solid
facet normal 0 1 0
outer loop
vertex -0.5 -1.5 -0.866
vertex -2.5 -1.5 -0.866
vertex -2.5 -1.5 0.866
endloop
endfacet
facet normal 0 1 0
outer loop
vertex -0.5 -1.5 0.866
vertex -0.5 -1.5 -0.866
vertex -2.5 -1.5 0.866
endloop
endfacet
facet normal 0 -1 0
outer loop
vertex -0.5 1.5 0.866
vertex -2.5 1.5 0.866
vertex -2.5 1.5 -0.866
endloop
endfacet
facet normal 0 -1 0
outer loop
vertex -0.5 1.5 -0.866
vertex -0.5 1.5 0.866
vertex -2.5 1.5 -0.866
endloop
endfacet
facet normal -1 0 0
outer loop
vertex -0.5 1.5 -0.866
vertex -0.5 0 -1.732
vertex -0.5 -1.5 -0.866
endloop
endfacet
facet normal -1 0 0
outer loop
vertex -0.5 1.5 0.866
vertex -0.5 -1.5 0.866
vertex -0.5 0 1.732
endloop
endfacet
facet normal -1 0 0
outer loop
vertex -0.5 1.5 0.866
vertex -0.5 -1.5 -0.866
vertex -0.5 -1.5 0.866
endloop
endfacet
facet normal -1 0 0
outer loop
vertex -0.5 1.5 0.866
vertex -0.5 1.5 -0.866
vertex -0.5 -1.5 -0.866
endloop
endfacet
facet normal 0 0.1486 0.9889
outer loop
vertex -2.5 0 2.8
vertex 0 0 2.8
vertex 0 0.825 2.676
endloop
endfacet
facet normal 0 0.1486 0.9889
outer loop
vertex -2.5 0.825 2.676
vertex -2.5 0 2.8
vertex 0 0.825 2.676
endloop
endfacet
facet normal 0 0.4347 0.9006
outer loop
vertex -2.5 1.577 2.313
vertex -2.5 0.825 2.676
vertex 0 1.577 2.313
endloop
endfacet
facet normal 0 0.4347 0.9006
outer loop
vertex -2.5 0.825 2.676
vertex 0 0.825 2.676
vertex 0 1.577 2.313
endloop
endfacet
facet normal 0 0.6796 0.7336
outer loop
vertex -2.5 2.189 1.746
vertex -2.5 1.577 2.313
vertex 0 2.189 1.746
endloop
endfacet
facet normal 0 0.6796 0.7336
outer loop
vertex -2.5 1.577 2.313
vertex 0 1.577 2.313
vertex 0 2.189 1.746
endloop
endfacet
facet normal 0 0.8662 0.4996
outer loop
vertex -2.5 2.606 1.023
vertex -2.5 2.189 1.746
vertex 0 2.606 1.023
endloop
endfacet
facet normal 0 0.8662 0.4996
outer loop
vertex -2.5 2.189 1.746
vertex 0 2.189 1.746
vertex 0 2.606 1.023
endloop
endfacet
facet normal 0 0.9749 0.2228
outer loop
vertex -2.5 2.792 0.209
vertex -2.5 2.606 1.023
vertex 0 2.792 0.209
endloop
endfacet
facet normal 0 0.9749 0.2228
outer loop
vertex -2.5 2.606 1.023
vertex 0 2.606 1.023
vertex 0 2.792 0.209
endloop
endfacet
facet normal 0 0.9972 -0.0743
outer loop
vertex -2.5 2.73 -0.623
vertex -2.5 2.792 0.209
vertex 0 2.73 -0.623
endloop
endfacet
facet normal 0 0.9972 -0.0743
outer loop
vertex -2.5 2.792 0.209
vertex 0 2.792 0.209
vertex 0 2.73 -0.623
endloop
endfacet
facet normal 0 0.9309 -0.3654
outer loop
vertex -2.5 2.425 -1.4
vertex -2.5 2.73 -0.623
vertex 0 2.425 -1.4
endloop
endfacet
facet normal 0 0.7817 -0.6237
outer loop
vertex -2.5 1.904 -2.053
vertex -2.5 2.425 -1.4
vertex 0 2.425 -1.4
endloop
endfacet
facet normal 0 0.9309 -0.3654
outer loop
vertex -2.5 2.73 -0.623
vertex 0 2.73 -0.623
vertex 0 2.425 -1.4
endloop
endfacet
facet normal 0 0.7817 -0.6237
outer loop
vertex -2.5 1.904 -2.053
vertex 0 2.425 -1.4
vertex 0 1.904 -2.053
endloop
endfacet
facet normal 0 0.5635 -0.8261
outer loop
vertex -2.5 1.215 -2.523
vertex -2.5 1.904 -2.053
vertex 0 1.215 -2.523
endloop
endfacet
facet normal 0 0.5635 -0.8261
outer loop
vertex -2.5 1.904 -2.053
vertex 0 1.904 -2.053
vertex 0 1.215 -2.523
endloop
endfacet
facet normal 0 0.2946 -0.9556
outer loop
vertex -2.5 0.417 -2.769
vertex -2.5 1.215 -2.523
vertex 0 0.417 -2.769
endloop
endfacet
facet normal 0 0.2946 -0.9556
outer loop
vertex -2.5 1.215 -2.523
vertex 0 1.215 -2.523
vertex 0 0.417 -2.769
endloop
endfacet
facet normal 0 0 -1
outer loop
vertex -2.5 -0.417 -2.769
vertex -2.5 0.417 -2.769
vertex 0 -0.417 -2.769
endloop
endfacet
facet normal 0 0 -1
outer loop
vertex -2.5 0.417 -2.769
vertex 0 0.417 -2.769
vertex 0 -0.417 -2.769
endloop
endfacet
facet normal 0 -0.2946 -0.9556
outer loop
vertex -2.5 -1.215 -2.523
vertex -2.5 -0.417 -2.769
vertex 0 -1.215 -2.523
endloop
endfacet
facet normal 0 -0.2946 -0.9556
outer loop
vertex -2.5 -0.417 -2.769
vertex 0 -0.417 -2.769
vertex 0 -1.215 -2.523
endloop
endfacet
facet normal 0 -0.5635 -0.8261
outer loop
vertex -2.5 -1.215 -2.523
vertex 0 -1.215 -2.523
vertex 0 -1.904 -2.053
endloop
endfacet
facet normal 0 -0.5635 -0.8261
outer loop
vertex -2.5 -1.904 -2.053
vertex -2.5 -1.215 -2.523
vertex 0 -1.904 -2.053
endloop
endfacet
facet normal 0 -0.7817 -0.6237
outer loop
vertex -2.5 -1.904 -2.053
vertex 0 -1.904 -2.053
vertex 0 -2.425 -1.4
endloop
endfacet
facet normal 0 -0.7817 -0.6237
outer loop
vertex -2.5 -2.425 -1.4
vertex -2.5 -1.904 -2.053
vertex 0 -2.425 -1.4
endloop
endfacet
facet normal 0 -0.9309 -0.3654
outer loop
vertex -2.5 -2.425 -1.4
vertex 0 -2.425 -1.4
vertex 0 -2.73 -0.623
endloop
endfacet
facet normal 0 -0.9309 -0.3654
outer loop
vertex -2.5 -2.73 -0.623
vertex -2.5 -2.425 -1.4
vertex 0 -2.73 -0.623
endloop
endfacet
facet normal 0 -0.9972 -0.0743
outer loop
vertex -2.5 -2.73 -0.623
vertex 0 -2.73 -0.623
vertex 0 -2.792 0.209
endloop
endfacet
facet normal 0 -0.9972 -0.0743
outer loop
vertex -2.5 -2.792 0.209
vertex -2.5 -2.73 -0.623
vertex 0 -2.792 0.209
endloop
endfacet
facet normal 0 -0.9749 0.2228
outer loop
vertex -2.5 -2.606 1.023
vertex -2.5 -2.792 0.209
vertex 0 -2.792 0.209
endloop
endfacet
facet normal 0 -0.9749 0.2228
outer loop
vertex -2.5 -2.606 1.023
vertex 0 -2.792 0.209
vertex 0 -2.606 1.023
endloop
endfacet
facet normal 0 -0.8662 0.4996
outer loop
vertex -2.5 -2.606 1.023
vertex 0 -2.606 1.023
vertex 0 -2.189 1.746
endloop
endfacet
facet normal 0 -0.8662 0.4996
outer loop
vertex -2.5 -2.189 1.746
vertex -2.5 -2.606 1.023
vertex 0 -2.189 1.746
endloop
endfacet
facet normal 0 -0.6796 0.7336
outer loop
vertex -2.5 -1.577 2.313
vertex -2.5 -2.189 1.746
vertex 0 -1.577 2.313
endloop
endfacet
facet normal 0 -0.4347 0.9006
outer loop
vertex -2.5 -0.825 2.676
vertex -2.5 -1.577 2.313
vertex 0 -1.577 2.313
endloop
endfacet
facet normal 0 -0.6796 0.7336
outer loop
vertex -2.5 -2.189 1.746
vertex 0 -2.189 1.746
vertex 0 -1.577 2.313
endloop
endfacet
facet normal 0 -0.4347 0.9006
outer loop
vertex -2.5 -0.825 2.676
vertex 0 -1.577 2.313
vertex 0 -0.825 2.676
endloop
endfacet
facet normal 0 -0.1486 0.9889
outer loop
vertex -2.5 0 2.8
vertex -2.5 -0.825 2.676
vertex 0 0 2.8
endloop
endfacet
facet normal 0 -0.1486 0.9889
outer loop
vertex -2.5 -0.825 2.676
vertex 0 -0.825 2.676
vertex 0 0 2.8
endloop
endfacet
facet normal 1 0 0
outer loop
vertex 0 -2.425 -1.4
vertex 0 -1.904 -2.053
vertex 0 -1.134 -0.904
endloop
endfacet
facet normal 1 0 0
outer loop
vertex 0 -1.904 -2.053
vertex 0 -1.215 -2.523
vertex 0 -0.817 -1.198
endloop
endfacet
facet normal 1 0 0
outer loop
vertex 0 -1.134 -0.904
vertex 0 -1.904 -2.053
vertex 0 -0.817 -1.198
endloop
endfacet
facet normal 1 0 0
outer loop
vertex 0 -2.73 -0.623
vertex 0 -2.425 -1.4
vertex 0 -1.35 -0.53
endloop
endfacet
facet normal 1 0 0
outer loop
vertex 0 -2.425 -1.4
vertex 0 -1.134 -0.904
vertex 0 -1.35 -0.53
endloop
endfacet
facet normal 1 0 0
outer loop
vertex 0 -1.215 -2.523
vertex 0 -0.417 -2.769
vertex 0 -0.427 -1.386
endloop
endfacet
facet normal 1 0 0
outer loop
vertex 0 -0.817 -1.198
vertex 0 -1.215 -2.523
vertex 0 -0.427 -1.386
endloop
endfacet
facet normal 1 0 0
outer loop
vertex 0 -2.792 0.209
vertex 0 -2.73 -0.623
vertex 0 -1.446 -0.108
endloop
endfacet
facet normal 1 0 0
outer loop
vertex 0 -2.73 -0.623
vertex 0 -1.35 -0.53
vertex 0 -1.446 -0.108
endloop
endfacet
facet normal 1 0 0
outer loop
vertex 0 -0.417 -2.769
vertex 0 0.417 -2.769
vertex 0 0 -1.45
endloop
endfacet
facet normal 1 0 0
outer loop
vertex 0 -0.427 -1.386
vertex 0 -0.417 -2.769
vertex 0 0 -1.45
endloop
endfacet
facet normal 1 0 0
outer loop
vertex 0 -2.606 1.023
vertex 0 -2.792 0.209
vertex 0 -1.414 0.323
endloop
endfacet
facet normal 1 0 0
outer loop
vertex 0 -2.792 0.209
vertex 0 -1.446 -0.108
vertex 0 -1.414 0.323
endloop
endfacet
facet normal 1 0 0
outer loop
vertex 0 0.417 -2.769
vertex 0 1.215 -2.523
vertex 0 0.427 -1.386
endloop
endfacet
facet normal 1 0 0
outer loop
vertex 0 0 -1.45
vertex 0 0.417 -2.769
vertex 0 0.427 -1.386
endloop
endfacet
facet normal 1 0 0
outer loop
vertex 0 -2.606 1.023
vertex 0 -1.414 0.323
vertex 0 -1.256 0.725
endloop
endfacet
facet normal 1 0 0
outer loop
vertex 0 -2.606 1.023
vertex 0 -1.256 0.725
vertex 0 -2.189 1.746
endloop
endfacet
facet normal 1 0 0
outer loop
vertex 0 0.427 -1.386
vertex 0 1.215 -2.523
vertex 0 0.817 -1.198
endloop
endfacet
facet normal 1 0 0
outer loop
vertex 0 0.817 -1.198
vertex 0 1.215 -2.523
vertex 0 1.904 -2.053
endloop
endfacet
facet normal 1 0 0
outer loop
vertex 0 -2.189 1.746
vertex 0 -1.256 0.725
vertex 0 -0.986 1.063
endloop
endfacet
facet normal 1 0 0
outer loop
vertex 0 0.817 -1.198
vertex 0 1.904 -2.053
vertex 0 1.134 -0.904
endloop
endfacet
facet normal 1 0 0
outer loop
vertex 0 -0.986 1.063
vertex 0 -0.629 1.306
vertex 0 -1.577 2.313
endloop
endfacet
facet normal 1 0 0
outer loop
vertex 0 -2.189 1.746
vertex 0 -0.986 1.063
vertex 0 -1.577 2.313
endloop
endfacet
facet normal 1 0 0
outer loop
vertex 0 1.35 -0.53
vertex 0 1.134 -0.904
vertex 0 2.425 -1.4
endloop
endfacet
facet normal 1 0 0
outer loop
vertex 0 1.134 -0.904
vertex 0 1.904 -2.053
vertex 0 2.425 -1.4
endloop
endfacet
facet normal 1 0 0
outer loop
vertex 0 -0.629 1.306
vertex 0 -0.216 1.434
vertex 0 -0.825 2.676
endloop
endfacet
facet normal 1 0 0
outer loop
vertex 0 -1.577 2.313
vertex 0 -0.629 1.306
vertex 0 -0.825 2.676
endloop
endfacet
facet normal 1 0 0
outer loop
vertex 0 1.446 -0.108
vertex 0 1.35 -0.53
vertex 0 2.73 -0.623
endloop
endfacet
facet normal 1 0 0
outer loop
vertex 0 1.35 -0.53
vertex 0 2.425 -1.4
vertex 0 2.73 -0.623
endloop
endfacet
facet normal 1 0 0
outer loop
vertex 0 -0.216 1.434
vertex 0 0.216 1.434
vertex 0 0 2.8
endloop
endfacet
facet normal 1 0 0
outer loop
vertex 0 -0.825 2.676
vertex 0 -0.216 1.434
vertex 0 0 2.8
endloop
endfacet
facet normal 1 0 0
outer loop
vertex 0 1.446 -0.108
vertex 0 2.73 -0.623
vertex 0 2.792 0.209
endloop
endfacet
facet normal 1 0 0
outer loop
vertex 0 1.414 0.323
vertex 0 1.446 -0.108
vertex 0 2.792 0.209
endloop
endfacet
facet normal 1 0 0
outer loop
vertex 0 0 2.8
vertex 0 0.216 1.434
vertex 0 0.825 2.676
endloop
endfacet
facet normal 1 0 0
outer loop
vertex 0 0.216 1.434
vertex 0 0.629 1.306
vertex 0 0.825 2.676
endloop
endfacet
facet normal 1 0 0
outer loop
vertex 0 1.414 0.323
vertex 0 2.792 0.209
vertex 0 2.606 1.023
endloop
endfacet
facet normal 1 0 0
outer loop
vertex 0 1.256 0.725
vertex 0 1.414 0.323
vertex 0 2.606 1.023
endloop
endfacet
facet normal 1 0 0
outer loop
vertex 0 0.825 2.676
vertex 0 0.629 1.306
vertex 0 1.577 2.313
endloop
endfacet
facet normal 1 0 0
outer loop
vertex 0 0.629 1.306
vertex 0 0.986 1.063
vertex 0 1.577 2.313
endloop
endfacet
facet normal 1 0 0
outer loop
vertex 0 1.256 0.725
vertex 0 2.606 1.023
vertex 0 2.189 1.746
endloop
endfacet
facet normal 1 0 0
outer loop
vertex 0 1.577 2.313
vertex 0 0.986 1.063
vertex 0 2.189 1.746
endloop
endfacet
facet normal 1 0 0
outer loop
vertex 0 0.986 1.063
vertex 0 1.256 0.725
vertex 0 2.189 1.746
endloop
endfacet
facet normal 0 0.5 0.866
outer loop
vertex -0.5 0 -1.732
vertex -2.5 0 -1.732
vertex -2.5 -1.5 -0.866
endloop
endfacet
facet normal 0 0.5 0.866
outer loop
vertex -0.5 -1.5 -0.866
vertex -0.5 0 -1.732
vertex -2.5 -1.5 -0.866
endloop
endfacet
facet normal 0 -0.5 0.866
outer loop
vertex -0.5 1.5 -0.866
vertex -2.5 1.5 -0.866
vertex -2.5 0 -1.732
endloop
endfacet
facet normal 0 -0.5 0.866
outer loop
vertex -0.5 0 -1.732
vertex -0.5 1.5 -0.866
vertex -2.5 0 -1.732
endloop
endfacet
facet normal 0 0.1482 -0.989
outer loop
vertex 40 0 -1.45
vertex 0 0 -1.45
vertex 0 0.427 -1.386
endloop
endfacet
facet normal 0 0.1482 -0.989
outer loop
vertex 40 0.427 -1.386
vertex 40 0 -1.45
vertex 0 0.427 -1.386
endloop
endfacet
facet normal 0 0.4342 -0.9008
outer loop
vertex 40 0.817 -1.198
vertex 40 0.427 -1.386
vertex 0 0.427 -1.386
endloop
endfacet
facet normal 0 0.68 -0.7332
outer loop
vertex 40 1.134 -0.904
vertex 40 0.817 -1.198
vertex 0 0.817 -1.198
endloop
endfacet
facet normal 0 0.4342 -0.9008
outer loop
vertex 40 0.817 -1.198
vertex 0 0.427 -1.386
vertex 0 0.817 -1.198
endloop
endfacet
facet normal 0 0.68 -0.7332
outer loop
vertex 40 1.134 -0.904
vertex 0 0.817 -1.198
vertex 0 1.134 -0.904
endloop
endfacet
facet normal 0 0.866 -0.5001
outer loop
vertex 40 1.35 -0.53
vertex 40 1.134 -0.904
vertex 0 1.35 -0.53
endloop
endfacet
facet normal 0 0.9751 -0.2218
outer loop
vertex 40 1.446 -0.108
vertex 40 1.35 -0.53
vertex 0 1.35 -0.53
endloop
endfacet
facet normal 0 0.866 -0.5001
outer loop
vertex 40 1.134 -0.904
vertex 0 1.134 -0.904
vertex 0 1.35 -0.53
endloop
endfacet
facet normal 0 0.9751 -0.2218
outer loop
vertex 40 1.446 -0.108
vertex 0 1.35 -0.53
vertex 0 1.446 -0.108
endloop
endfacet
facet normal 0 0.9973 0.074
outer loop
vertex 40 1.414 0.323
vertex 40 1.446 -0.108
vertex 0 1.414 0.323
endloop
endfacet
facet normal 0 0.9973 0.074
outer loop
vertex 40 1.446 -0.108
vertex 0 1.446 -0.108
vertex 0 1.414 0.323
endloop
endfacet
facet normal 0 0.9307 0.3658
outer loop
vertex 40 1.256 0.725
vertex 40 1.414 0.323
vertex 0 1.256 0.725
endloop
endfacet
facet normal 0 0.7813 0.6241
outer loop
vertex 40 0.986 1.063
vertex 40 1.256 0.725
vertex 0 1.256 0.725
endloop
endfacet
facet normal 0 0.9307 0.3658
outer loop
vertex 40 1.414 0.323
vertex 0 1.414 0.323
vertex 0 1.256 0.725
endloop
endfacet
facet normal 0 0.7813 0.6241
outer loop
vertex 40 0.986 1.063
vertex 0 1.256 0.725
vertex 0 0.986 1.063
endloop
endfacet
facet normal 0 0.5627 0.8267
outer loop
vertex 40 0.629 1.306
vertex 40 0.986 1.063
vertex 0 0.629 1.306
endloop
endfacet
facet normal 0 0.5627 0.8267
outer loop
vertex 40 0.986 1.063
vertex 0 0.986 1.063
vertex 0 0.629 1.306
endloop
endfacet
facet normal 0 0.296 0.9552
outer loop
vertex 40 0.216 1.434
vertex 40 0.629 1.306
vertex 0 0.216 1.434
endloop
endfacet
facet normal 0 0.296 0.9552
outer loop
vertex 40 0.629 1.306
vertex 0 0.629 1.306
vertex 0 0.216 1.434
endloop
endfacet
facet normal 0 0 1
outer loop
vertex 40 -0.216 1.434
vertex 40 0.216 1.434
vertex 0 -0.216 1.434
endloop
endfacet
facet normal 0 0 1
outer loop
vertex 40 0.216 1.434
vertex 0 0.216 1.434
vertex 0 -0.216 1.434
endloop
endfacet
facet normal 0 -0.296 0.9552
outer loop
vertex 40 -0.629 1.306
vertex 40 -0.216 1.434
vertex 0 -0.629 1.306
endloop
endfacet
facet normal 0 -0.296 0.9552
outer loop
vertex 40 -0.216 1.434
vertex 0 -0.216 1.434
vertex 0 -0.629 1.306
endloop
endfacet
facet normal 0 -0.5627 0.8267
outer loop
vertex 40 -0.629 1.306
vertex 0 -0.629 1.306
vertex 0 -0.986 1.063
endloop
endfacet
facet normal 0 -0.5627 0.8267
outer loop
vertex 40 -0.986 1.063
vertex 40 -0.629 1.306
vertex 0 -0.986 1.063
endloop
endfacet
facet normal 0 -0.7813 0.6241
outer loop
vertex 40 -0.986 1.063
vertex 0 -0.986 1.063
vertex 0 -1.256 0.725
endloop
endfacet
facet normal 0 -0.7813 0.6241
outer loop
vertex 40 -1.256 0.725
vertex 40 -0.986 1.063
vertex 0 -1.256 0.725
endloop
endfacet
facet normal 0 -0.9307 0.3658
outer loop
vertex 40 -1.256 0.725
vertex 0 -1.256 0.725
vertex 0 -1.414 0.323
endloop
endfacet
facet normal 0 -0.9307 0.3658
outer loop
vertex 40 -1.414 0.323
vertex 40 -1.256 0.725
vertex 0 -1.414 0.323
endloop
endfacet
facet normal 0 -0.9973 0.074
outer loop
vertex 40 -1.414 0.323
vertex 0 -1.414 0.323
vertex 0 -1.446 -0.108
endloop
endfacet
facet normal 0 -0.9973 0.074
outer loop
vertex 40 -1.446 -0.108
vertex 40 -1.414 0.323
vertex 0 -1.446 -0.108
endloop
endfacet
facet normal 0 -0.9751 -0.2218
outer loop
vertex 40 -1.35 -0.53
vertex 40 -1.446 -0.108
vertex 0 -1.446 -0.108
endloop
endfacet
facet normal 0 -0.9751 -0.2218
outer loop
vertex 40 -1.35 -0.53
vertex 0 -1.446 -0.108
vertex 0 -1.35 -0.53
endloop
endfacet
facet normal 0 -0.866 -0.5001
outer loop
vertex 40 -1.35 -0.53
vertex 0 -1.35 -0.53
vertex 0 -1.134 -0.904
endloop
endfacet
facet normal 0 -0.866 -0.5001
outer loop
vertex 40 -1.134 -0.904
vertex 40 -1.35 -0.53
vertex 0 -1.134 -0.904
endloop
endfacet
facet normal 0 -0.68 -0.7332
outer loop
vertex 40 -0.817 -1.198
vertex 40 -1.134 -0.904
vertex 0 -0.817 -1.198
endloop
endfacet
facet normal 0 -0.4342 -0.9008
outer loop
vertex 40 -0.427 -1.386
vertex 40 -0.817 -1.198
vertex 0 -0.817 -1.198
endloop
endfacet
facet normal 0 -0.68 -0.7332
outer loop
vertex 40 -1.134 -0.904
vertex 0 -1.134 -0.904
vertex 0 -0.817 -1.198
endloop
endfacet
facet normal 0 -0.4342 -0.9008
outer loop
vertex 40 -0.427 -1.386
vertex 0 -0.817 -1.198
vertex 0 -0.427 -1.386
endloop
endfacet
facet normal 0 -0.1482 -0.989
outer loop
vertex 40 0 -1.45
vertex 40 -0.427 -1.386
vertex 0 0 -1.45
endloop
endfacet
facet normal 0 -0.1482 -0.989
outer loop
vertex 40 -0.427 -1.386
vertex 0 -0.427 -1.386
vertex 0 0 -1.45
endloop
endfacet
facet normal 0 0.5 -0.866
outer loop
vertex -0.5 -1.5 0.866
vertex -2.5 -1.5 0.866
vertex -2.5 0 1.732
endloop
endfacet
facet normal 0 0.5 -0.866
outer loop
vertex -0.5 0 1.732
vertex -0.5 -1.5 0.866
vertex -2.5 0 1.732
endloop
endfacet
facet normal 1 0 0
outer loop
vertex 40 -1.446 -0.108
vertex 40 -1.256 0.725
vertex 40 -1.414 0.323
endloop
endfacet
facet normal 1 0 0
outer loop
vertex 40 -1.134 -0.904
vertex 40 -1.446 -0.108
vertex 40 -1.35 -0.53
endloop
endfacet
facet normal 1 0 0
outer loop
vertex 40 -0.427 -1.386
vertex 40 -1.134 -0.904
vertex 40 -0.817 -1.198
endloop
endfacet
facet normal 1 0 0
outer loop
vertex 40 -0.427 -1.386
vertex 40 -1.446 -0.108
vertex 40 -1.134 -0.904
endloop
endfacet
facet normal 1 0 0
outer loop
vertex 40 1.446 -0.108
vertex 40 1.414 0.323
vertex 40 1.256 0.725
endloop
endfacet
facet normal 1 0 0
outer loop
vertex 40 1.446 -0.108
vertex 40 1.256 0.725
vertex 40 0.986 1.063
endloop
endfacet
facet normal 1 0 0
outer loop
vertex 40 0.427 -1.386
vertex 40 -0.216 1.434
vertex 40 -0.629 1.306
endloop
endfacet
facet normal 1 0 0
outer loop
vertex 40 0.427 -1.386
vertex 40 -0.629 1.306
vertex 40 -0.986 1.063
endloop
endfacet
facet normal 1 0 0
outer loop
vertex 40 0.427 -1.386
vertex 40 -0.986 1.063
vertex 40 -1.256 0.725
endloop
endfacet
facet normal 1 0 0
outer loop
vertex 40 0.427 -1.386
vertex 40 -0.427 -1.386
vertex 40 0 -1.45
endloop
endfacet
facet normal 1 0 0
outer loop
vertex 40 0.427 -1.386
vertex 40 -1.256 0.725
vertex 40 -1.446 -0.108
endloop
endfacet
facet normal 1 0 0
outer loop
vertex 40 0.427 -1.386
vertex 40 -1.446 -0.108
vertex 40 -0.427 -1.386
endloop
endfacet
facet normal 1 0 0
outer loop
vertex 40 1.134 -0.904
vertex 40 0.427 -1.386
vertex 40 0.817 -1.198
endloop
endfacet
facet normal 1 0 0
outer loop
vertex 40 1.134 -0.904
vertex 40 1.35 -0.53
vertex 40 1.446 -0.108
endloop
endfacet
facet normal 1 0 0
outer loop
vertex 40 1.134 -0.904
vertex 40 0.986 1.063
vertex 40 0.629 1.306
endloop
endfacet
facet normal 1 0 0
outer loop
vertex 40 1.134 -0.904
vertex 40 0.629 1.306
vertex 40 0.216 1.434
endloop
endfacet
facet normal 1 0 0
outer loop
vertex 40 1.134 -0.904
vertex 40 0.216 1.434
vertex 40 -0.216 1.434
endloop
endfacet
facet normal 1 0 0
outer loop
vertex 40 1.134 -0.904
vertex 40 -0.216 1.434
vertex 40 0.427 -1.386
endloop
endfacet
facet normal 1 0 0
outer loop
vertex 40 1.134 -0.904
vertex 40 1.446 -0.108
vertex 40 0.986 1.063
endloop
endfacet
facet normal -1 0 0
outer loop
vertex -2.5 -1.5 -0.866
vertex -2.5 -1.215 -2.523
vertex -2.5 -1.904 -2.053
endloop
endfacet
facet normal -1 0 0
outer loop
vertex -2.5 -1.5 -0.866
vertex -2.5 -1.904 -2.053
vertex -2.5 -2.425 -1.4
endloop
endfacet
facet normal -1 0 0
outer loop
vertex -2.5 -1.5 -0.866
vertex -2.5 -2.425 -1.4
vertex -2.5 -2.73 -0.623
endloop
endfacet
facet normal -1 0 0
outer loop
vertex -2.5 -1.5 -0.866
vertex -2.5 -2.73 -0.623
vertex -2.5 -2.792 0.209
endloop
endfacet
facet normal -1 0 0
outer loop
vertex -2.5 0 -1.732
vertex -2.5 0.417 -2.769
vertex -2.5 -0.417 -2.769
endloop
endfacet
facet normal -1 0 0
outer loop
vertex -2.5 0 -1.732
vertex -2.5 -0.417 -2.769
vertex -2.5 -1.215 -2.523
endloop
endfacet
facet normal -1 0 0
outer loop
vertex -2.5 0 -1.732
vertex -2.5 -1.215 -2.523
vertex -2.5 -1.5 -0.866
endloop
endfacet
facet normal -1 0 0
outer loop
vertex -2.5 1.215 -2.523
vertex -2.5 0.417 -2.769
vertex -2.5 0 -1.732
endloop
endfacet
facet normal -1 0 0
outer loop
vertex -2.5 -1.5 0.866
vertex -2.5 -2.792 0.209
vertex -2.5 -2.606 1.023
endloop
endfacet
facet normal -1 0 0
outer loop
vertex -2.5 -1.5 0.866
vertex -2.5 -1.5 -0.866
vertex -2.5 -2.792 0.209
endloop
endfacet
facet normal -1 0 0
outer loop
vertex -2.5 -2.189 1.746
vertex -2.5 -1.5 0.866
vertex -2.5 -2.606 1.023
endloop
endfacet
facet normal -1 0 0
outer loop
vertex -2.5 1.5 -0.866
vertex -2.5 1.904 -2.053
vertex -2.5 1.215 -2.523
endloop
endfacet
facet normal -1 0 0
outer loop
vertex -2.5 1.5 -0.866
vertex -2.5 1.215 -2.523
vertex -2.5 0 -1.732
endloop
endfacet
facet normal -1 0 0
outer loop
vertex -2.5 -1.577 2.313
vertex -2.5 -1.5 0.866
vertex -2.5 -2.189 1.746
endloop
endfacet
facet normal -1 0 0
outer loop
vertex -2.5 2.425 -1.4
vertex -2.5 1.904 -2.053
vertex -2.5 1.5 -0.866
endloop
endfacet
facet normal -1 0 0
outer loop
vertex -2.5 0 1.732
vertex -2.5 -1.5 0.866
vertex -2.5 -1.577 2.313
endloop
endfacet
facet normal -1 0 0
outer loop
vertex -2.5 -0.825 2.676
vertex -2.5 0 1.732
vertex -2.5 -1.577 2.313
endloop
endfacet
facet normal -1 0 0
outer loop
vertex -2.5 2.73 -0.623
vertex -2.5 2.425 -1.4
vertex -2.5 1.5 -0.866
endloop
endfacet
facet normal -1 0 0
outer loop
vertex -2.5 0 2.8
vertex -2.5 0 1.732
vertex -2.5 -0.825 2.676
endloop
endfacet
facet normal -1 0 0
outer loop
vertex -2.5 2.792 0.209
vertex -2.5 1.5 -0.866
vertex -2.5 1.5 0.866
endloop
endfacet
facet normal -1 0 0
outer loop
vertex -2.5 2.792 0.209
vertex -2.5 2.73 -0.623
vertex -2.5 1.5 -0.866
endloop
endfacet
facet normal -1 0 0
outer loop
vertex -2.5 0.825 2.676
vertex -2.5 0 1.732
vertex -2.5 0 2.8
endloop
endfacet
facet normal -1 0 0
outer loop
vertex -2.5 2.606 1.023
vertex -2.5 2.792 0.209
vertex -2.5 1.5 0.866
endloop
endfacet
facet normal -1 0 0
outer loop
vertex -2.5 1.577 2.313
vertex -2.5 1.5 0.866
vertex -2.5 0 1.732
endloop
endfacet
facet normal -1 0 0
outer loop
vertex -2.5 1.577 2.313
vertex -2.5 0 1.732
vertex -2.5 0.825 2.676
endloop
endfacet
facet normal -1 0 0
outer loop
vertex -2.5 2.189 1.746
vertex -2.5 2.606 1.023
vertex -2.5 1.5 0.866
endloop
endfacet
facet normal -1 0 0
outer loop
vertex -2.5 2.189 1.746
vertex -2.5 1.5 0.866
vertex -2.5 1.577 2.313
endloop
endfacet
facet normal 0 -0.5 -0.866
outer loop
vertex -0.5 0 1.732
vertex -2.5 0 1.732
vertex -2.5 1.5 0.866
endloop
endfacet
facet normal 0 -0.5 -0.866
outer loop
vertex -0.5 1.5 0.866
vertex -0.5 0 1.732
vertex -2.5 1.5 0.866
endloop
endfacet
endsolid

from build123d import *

# Parameters (mm, degrees)
IZIM1_R                     = 1.45
Y_KSEKLIK_EKSTR_ZYON1_DEPTH = 40
IZIM2_R                     = 2.8
Y_KSEKLIK_EKSTR_ZYON2_DEPTH = 2.5
KES_EKSTR_ZYON1_DEPTH       = 2


with BuildPart() as part:
    # Çizim1 → Yükseklik-Ekstrüzyon1 (new body)
    with BuildSketch(Plane(origin=(0, 0, 0), x_dir=(0, 0, -1), z_dir=(1, 0, 0))):
        Circle(IZIM1_R)
    extrude(amount=Y_KSEKLIK_EKSTR_ZYON1_DEPTH)

    # Çizim2 → Yükseklik-Ekstrüzyon2 (add)
    with BuildSketch(Plane.ZY):
        Circle(IZIM2_R)
    extrude(amount=Y_KSEKLIK_EKSTR_ZYON2_DEPTH)

    # Çizim3 → Kes-Ekstrüzyon1 (cut)
    with BuildSketch(Plane.ZY.offset(2.5)):
        Polygon((0.866025404, -1.5), (1.732050808, 0), (0.866025404, 1.5), (-0.866025404, 1.5), (-1.732050808, 0), (-0.866025404, -1.5), align=None)
    extrude(amount=-KES_EKSTR_ZYON1_DEPTH, mode=Mode.SUBTRACT)


solid = part.part
